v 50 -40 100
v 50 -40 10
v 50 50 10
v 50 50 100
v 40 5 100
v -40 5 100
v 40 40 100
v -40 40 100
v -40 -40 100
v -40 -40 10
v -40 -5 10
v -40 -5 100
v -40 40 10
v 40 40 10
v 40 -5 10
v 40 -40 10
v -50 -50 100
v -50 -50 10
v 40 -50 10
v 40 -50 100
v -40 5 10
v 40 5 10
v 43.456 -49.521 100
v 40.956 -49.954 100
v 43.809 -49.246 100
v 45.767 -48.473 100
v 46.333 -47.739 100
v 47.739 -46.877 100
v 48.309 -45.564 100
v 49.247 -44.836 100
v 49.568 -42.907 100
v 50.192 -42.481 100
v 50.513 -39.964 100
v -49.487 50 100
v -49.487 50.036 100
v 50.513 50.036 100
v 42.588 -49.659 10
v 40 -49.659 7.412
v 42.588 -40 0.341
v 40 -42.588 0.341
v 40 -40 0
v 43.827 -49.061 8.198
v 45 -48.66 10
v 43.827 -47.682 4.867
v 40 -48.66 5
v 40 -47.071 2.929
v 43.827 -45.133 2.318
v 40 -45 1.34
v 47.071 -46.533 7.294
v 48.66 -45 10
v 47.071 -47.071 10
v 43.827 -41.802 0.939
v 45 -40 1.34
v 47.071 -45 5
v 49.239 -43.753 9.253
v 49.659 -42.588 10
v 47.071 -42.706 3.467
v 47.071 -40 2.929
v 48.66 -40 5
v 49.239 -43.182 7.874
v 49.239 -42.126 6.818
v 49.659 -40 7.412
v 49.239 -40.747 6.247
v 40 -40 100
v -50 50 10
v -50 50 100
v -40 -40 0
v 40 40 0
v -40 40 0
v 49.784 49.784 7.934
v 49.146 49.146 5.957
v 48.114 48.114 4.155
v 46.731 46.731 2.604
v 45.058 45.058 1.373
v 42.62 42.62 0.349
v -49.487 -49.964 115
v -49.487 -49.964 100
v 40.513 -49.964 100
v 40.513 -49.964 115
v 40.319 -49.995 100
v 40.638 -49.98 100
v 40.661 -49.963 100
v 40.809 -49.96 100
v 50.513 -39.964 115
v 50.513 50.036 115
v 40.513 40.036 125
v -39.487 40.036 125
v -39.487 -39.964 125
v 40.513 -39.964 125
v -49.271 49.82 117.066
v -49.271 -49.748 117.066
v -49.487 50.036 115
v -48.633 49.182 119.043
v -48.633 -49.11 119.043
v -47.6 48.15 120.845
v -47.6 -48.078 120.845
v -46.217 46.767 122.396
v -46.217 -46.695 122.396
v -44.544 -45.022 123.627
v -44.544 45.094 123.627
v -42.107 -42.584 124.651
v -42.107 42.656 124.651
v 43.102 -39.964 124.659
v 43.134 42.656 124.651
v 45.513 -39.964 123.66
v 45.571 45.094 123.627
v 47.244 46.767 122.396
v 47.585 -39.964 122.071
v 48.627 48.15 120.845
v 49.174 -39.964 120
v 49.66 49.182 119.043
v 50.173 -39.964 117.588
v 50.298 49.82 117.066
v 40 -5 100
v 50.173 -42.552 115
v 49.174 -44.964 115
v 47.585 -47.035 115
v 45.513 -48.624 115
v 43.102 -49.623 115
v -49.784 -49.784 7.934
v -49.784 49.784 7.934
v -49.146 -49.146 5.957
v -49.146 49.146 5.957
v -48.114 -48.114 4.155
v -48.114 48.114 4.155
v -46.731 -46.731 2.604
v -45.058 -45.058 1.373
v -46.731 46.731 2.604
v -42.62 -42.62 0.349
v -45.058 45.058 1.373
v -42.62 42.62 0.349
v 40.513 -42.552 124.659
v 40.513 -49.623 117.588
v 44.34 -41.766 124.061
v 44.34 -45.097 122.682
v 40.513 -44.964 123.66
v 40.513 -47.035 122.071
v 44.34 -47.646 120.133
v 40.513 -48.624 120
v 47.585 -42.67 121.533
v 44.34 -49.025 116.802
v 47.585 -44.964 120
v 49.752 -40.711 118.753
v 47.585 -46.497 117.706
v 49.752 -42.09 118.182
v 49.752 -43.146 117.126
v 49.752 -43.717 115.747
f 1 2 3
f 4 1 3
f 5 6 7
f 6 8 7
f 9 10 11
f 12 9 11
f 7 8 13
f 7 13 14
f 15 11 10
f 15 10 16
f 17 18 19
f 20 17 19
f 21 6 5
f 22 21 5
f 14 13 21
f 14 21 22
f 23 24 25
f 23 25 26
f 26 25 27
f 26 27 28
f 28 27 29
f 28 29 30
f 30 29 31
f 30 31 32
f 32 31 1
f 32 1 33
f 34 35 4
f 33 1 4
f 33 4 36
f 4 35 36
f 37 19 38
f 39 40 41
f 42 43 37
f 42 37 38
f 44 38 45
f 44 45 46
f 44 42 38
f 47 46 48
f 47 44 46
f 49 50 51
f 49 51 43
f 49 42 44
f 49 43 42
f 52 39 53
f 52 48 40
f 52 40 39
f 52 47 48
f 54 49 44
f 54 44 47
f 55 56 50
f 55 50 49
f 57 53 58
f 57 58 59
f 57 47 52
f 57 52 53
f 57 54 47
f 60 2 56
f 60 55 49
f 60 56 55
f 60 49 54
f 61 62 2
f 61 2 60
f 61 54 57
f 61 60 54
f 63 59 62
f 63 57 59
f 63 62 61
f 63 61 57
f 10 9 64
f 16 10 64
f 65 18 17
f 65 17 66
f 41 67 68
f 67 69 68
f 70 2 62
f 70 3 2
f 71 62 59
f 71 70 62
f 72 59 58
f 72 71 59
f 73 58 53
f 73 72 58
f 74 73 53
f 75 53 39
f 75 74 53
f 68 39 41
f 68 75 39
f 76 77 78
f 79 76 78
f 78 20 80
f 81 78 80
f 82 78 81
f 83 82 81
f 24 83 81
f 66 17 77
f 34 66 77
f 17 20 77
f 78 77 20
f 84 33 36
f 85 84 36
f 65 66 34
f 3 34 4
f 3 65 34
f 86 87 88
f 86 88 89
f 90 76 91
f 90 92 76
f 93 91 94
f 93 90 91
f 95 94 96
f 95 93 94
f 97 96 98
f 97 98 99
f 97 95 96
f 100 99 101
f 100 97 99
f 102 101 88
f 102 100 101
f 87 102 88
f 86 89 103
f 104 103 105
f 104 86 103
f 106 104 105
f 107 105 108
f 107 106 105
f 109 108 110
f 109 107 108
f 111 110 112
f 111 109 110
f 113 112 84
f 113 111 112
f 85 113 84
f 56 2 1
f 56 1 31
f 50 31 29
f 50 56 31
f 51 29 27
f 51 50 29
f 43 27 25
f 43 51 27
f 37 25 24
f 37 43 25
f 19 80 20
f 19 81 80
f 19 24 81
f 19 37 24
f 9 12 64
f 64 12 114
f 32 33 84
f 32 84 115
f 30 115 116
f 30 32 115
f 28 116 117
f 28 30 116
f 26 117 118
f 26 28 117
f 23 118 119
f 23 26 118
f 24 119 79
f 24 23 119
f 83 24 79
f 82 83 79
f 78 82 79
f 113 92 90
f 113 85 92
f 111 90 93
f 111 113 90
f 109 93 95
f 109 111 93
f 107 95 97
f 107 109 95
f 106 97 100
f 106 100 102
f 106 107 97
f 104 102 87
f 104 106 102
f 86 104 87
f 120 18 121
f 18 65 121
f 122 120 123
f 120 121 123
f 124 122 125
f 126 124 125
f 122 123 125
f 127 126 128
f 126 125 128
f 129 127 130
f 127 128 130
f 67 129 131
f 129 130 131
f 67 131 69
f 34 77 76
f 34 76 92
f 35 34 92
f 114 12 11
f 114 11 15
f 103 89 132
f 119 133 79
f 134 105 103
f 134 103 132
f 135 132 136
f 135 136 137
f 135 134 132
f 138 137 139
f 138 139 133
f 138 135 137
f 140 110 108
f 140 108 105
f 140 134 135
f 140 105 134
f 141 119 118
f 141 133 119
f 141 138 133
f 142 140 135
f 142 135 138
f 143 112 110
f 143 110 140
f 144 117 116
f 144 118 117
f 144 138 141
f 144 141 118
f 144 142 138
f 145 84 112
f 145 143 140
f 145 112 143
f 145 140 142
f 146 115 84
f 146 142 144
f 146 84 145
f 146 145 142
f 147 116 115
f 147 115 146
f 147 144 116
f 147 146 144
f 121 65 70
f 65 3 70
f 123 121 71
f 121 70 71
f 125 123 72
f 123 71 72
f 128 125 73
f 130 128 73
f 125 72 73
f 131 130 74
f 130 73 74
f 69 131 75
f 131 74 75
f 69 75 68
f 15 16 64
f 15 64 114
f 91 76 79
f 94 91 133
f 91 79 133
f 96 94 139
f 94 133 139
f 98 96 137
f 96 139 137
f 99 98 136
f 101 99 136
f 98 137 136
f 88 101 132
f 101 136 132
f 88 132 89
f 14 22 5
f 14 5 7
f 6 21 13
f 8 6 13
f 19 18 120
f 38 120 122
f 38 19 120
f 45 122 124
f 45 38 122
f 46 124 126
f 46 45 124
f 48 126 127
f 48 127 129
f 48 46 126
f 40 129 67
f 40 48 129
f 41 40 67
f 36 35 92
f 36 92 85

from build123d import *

# Parameters (mm, degrees)
F0_W         = 100
F0_H         = 100
F1_DEPTH     = 100
F2_T         = -10
F3_W         = 80
F3_H         = 10
F4_DEPTH     = 100
F6_W         = 100
F6_H         = 100
F7_DEPTH     = 25
F8_R         = 10
F9_R         = 10
F10_T1_DEPTH = 90
F10_S5_W     = 10
F10_S5_H     = 10
F10_T6_DEPTH = 10
F11_T1_DEPTH = 15
F11_S5_W     = 10.2
F11_S5_H     = 10.2
F11_T6_DEPTH = 10.2


# Not quite as in the source:
# - a fillet or chamfer that OpenCascade refuses, or shapes differently, is made with other operations: its cross-section is extruded or revolved along the edge and cut away or added


with BuildPart() as f1:
    # F0 (on Top) → F1 (new body)
    with BuildSketch(Plane.XY):
        Rectangle(F0_W, F0_H)
    extrude(amount=F1_DEPTH)

    # F2
    f2_openings = [f1.faces().sort_by_distance(p)[0] for p in [
        (0, 0, 100),
    ]]
    offset(amount=F2_T, openings=f2_openings)

    # F3 (on Top) → F4 (join)
    with BuildSketch(Plane.XY):
        Rectangle(F3_W, F3_H)
    extrude(amount=F4_DEPTH)

    # F6 (on offset) → F7 (join)
    with BuildSketch(Plane.XY.offset(100)):
        with Locations((0.513449031, 0.0360049307)):
            Rectangle(F6_W, F6_H)
    extrude(amount=F7_DEPTH)

    # F8
    f8_edges = [f1.edges().sort_by_distance(p)[0] for p in [
        (0.513449, 50.036005, 125),
        (-49.486551, 0.036005, 125),
        (0.513449, -49.963995, 125),
        (50.513449, 0.036005, 125),
    ]]
    fillet(f8_edges, radius=F8_R)

    # F9
    f9_edges = [f1.edges().sort_by_distance(p)[0] for p in [
        (0, -50, 0),
        (50, 0, 0),
        (0, 50, 0),
        (-50, 0, 0),
    ]]
    fillet(f9_edges, radius=F9_R)

    # F10: fillet of radius 10 on 1 edges, made by hand

    # F10_s2 → F10_t1 (cut)
    with BuildSketch(Plane.XY.offset(10)):
        with BuildLine():
            ThreePointArc((50, -40), (47.0710678119, -47.0710678119), (40, -50))
            Line((40, -50), (50, -50))
            Line((50, -50), (50, -40))
        make_face()
    extrude(amount=F10_T1_DEPTH, mode=Mode.SUBTRACT)


with BuildPart() as f10_tool4:
    # F10_s5 → F10_t6 (new body)
    with BuildSketch(Plane.YZ.offset(40)):
        with Locations((-45, 5)):
            Rectangle(F10_S5_W, F10_S5_H)
    extrude(amount=F10_T6_DEPTH)

    # F10_s7 → F10_t8 (revolve, cut)
    with BuildSketch(Plane(origin=(40, -40, 10), x_dir=(0, 0.7071067812, 0.7071067812), z_dir=(0, 0.7071067812, -0.7071067812))):
        with BuildLine():
            ThreePointArc((0, -10), (10, 0), (0, 10))
            Line((0, 10), (0, -10))
        make_face()
    revolve(axis=Axis((40, -40, 10), (1, 0, 0)), mode=Mode.SUBTRACT)


with BuildPart() as f1_1:
    add(f1.part)

    # F10_t3: cut F10_tool4
    add(f10_tool4.part, mode=Mode.SUBTRACT)

    # F11: fillet of radius 10 on 1 edges, made by hand

    # F11_s2 → F11_t1 (cut)
    with BuildSketch(Plane.XY.offset(100)):
        with BuildLine():
            ThreePointArc((50.513449031, -39.9639950693), (47.5845168429, -47.0350628811), (40.513449031, -49.9639950693))
            Line((40.513449031, -49.9639950693), (50.513449031, -49.9639950693))
            Line((50.513449031, -49.9639950693), (50.513449031, -39.9639950693))
        make_face()
    extrude(amount=F11_T1_DEPTH, mode=Mode.SUBTRACT)


with BuildPart() as f11_tool4:
    # F11_s5 → F11_t6 (new body)
    with BuildSketch(Plane.YZ.offset(40.513449031)):
        with Locations((-45.0639950693, 120.1)):
            Rectangle(F11_S5_W, F11_S5_H)
    extrude(amount=F11_T6_DEPTH)

    # F11_s7 → F11_t8 (revolve, cut)
    with BuildSketch(Plane(origin=(40.513449031, -39.9639950693, 115), x_dir=(0, 0.7071067812, -0.7071067812), z_dir=(0, -0.7071067812, -0.7071067812))):
        with BuildLine():
            ThreePointArc((0, -10), (10, 0), (0, 10))
            Line((0, 10), (0, -10))
        make_face()
    revolve(axis=Axis((40.513449031, -39.9639950693, 115), (1, 0, 0)), mode=Mode.SUBTRACT)


with BuildPart() as f1_2:
    add(f1_1.part)

    # F11_t3: cut F11_tool4
    add(f11_tool4.part, mode=Mode.SUBTRACT)


solid = f1_2.part
